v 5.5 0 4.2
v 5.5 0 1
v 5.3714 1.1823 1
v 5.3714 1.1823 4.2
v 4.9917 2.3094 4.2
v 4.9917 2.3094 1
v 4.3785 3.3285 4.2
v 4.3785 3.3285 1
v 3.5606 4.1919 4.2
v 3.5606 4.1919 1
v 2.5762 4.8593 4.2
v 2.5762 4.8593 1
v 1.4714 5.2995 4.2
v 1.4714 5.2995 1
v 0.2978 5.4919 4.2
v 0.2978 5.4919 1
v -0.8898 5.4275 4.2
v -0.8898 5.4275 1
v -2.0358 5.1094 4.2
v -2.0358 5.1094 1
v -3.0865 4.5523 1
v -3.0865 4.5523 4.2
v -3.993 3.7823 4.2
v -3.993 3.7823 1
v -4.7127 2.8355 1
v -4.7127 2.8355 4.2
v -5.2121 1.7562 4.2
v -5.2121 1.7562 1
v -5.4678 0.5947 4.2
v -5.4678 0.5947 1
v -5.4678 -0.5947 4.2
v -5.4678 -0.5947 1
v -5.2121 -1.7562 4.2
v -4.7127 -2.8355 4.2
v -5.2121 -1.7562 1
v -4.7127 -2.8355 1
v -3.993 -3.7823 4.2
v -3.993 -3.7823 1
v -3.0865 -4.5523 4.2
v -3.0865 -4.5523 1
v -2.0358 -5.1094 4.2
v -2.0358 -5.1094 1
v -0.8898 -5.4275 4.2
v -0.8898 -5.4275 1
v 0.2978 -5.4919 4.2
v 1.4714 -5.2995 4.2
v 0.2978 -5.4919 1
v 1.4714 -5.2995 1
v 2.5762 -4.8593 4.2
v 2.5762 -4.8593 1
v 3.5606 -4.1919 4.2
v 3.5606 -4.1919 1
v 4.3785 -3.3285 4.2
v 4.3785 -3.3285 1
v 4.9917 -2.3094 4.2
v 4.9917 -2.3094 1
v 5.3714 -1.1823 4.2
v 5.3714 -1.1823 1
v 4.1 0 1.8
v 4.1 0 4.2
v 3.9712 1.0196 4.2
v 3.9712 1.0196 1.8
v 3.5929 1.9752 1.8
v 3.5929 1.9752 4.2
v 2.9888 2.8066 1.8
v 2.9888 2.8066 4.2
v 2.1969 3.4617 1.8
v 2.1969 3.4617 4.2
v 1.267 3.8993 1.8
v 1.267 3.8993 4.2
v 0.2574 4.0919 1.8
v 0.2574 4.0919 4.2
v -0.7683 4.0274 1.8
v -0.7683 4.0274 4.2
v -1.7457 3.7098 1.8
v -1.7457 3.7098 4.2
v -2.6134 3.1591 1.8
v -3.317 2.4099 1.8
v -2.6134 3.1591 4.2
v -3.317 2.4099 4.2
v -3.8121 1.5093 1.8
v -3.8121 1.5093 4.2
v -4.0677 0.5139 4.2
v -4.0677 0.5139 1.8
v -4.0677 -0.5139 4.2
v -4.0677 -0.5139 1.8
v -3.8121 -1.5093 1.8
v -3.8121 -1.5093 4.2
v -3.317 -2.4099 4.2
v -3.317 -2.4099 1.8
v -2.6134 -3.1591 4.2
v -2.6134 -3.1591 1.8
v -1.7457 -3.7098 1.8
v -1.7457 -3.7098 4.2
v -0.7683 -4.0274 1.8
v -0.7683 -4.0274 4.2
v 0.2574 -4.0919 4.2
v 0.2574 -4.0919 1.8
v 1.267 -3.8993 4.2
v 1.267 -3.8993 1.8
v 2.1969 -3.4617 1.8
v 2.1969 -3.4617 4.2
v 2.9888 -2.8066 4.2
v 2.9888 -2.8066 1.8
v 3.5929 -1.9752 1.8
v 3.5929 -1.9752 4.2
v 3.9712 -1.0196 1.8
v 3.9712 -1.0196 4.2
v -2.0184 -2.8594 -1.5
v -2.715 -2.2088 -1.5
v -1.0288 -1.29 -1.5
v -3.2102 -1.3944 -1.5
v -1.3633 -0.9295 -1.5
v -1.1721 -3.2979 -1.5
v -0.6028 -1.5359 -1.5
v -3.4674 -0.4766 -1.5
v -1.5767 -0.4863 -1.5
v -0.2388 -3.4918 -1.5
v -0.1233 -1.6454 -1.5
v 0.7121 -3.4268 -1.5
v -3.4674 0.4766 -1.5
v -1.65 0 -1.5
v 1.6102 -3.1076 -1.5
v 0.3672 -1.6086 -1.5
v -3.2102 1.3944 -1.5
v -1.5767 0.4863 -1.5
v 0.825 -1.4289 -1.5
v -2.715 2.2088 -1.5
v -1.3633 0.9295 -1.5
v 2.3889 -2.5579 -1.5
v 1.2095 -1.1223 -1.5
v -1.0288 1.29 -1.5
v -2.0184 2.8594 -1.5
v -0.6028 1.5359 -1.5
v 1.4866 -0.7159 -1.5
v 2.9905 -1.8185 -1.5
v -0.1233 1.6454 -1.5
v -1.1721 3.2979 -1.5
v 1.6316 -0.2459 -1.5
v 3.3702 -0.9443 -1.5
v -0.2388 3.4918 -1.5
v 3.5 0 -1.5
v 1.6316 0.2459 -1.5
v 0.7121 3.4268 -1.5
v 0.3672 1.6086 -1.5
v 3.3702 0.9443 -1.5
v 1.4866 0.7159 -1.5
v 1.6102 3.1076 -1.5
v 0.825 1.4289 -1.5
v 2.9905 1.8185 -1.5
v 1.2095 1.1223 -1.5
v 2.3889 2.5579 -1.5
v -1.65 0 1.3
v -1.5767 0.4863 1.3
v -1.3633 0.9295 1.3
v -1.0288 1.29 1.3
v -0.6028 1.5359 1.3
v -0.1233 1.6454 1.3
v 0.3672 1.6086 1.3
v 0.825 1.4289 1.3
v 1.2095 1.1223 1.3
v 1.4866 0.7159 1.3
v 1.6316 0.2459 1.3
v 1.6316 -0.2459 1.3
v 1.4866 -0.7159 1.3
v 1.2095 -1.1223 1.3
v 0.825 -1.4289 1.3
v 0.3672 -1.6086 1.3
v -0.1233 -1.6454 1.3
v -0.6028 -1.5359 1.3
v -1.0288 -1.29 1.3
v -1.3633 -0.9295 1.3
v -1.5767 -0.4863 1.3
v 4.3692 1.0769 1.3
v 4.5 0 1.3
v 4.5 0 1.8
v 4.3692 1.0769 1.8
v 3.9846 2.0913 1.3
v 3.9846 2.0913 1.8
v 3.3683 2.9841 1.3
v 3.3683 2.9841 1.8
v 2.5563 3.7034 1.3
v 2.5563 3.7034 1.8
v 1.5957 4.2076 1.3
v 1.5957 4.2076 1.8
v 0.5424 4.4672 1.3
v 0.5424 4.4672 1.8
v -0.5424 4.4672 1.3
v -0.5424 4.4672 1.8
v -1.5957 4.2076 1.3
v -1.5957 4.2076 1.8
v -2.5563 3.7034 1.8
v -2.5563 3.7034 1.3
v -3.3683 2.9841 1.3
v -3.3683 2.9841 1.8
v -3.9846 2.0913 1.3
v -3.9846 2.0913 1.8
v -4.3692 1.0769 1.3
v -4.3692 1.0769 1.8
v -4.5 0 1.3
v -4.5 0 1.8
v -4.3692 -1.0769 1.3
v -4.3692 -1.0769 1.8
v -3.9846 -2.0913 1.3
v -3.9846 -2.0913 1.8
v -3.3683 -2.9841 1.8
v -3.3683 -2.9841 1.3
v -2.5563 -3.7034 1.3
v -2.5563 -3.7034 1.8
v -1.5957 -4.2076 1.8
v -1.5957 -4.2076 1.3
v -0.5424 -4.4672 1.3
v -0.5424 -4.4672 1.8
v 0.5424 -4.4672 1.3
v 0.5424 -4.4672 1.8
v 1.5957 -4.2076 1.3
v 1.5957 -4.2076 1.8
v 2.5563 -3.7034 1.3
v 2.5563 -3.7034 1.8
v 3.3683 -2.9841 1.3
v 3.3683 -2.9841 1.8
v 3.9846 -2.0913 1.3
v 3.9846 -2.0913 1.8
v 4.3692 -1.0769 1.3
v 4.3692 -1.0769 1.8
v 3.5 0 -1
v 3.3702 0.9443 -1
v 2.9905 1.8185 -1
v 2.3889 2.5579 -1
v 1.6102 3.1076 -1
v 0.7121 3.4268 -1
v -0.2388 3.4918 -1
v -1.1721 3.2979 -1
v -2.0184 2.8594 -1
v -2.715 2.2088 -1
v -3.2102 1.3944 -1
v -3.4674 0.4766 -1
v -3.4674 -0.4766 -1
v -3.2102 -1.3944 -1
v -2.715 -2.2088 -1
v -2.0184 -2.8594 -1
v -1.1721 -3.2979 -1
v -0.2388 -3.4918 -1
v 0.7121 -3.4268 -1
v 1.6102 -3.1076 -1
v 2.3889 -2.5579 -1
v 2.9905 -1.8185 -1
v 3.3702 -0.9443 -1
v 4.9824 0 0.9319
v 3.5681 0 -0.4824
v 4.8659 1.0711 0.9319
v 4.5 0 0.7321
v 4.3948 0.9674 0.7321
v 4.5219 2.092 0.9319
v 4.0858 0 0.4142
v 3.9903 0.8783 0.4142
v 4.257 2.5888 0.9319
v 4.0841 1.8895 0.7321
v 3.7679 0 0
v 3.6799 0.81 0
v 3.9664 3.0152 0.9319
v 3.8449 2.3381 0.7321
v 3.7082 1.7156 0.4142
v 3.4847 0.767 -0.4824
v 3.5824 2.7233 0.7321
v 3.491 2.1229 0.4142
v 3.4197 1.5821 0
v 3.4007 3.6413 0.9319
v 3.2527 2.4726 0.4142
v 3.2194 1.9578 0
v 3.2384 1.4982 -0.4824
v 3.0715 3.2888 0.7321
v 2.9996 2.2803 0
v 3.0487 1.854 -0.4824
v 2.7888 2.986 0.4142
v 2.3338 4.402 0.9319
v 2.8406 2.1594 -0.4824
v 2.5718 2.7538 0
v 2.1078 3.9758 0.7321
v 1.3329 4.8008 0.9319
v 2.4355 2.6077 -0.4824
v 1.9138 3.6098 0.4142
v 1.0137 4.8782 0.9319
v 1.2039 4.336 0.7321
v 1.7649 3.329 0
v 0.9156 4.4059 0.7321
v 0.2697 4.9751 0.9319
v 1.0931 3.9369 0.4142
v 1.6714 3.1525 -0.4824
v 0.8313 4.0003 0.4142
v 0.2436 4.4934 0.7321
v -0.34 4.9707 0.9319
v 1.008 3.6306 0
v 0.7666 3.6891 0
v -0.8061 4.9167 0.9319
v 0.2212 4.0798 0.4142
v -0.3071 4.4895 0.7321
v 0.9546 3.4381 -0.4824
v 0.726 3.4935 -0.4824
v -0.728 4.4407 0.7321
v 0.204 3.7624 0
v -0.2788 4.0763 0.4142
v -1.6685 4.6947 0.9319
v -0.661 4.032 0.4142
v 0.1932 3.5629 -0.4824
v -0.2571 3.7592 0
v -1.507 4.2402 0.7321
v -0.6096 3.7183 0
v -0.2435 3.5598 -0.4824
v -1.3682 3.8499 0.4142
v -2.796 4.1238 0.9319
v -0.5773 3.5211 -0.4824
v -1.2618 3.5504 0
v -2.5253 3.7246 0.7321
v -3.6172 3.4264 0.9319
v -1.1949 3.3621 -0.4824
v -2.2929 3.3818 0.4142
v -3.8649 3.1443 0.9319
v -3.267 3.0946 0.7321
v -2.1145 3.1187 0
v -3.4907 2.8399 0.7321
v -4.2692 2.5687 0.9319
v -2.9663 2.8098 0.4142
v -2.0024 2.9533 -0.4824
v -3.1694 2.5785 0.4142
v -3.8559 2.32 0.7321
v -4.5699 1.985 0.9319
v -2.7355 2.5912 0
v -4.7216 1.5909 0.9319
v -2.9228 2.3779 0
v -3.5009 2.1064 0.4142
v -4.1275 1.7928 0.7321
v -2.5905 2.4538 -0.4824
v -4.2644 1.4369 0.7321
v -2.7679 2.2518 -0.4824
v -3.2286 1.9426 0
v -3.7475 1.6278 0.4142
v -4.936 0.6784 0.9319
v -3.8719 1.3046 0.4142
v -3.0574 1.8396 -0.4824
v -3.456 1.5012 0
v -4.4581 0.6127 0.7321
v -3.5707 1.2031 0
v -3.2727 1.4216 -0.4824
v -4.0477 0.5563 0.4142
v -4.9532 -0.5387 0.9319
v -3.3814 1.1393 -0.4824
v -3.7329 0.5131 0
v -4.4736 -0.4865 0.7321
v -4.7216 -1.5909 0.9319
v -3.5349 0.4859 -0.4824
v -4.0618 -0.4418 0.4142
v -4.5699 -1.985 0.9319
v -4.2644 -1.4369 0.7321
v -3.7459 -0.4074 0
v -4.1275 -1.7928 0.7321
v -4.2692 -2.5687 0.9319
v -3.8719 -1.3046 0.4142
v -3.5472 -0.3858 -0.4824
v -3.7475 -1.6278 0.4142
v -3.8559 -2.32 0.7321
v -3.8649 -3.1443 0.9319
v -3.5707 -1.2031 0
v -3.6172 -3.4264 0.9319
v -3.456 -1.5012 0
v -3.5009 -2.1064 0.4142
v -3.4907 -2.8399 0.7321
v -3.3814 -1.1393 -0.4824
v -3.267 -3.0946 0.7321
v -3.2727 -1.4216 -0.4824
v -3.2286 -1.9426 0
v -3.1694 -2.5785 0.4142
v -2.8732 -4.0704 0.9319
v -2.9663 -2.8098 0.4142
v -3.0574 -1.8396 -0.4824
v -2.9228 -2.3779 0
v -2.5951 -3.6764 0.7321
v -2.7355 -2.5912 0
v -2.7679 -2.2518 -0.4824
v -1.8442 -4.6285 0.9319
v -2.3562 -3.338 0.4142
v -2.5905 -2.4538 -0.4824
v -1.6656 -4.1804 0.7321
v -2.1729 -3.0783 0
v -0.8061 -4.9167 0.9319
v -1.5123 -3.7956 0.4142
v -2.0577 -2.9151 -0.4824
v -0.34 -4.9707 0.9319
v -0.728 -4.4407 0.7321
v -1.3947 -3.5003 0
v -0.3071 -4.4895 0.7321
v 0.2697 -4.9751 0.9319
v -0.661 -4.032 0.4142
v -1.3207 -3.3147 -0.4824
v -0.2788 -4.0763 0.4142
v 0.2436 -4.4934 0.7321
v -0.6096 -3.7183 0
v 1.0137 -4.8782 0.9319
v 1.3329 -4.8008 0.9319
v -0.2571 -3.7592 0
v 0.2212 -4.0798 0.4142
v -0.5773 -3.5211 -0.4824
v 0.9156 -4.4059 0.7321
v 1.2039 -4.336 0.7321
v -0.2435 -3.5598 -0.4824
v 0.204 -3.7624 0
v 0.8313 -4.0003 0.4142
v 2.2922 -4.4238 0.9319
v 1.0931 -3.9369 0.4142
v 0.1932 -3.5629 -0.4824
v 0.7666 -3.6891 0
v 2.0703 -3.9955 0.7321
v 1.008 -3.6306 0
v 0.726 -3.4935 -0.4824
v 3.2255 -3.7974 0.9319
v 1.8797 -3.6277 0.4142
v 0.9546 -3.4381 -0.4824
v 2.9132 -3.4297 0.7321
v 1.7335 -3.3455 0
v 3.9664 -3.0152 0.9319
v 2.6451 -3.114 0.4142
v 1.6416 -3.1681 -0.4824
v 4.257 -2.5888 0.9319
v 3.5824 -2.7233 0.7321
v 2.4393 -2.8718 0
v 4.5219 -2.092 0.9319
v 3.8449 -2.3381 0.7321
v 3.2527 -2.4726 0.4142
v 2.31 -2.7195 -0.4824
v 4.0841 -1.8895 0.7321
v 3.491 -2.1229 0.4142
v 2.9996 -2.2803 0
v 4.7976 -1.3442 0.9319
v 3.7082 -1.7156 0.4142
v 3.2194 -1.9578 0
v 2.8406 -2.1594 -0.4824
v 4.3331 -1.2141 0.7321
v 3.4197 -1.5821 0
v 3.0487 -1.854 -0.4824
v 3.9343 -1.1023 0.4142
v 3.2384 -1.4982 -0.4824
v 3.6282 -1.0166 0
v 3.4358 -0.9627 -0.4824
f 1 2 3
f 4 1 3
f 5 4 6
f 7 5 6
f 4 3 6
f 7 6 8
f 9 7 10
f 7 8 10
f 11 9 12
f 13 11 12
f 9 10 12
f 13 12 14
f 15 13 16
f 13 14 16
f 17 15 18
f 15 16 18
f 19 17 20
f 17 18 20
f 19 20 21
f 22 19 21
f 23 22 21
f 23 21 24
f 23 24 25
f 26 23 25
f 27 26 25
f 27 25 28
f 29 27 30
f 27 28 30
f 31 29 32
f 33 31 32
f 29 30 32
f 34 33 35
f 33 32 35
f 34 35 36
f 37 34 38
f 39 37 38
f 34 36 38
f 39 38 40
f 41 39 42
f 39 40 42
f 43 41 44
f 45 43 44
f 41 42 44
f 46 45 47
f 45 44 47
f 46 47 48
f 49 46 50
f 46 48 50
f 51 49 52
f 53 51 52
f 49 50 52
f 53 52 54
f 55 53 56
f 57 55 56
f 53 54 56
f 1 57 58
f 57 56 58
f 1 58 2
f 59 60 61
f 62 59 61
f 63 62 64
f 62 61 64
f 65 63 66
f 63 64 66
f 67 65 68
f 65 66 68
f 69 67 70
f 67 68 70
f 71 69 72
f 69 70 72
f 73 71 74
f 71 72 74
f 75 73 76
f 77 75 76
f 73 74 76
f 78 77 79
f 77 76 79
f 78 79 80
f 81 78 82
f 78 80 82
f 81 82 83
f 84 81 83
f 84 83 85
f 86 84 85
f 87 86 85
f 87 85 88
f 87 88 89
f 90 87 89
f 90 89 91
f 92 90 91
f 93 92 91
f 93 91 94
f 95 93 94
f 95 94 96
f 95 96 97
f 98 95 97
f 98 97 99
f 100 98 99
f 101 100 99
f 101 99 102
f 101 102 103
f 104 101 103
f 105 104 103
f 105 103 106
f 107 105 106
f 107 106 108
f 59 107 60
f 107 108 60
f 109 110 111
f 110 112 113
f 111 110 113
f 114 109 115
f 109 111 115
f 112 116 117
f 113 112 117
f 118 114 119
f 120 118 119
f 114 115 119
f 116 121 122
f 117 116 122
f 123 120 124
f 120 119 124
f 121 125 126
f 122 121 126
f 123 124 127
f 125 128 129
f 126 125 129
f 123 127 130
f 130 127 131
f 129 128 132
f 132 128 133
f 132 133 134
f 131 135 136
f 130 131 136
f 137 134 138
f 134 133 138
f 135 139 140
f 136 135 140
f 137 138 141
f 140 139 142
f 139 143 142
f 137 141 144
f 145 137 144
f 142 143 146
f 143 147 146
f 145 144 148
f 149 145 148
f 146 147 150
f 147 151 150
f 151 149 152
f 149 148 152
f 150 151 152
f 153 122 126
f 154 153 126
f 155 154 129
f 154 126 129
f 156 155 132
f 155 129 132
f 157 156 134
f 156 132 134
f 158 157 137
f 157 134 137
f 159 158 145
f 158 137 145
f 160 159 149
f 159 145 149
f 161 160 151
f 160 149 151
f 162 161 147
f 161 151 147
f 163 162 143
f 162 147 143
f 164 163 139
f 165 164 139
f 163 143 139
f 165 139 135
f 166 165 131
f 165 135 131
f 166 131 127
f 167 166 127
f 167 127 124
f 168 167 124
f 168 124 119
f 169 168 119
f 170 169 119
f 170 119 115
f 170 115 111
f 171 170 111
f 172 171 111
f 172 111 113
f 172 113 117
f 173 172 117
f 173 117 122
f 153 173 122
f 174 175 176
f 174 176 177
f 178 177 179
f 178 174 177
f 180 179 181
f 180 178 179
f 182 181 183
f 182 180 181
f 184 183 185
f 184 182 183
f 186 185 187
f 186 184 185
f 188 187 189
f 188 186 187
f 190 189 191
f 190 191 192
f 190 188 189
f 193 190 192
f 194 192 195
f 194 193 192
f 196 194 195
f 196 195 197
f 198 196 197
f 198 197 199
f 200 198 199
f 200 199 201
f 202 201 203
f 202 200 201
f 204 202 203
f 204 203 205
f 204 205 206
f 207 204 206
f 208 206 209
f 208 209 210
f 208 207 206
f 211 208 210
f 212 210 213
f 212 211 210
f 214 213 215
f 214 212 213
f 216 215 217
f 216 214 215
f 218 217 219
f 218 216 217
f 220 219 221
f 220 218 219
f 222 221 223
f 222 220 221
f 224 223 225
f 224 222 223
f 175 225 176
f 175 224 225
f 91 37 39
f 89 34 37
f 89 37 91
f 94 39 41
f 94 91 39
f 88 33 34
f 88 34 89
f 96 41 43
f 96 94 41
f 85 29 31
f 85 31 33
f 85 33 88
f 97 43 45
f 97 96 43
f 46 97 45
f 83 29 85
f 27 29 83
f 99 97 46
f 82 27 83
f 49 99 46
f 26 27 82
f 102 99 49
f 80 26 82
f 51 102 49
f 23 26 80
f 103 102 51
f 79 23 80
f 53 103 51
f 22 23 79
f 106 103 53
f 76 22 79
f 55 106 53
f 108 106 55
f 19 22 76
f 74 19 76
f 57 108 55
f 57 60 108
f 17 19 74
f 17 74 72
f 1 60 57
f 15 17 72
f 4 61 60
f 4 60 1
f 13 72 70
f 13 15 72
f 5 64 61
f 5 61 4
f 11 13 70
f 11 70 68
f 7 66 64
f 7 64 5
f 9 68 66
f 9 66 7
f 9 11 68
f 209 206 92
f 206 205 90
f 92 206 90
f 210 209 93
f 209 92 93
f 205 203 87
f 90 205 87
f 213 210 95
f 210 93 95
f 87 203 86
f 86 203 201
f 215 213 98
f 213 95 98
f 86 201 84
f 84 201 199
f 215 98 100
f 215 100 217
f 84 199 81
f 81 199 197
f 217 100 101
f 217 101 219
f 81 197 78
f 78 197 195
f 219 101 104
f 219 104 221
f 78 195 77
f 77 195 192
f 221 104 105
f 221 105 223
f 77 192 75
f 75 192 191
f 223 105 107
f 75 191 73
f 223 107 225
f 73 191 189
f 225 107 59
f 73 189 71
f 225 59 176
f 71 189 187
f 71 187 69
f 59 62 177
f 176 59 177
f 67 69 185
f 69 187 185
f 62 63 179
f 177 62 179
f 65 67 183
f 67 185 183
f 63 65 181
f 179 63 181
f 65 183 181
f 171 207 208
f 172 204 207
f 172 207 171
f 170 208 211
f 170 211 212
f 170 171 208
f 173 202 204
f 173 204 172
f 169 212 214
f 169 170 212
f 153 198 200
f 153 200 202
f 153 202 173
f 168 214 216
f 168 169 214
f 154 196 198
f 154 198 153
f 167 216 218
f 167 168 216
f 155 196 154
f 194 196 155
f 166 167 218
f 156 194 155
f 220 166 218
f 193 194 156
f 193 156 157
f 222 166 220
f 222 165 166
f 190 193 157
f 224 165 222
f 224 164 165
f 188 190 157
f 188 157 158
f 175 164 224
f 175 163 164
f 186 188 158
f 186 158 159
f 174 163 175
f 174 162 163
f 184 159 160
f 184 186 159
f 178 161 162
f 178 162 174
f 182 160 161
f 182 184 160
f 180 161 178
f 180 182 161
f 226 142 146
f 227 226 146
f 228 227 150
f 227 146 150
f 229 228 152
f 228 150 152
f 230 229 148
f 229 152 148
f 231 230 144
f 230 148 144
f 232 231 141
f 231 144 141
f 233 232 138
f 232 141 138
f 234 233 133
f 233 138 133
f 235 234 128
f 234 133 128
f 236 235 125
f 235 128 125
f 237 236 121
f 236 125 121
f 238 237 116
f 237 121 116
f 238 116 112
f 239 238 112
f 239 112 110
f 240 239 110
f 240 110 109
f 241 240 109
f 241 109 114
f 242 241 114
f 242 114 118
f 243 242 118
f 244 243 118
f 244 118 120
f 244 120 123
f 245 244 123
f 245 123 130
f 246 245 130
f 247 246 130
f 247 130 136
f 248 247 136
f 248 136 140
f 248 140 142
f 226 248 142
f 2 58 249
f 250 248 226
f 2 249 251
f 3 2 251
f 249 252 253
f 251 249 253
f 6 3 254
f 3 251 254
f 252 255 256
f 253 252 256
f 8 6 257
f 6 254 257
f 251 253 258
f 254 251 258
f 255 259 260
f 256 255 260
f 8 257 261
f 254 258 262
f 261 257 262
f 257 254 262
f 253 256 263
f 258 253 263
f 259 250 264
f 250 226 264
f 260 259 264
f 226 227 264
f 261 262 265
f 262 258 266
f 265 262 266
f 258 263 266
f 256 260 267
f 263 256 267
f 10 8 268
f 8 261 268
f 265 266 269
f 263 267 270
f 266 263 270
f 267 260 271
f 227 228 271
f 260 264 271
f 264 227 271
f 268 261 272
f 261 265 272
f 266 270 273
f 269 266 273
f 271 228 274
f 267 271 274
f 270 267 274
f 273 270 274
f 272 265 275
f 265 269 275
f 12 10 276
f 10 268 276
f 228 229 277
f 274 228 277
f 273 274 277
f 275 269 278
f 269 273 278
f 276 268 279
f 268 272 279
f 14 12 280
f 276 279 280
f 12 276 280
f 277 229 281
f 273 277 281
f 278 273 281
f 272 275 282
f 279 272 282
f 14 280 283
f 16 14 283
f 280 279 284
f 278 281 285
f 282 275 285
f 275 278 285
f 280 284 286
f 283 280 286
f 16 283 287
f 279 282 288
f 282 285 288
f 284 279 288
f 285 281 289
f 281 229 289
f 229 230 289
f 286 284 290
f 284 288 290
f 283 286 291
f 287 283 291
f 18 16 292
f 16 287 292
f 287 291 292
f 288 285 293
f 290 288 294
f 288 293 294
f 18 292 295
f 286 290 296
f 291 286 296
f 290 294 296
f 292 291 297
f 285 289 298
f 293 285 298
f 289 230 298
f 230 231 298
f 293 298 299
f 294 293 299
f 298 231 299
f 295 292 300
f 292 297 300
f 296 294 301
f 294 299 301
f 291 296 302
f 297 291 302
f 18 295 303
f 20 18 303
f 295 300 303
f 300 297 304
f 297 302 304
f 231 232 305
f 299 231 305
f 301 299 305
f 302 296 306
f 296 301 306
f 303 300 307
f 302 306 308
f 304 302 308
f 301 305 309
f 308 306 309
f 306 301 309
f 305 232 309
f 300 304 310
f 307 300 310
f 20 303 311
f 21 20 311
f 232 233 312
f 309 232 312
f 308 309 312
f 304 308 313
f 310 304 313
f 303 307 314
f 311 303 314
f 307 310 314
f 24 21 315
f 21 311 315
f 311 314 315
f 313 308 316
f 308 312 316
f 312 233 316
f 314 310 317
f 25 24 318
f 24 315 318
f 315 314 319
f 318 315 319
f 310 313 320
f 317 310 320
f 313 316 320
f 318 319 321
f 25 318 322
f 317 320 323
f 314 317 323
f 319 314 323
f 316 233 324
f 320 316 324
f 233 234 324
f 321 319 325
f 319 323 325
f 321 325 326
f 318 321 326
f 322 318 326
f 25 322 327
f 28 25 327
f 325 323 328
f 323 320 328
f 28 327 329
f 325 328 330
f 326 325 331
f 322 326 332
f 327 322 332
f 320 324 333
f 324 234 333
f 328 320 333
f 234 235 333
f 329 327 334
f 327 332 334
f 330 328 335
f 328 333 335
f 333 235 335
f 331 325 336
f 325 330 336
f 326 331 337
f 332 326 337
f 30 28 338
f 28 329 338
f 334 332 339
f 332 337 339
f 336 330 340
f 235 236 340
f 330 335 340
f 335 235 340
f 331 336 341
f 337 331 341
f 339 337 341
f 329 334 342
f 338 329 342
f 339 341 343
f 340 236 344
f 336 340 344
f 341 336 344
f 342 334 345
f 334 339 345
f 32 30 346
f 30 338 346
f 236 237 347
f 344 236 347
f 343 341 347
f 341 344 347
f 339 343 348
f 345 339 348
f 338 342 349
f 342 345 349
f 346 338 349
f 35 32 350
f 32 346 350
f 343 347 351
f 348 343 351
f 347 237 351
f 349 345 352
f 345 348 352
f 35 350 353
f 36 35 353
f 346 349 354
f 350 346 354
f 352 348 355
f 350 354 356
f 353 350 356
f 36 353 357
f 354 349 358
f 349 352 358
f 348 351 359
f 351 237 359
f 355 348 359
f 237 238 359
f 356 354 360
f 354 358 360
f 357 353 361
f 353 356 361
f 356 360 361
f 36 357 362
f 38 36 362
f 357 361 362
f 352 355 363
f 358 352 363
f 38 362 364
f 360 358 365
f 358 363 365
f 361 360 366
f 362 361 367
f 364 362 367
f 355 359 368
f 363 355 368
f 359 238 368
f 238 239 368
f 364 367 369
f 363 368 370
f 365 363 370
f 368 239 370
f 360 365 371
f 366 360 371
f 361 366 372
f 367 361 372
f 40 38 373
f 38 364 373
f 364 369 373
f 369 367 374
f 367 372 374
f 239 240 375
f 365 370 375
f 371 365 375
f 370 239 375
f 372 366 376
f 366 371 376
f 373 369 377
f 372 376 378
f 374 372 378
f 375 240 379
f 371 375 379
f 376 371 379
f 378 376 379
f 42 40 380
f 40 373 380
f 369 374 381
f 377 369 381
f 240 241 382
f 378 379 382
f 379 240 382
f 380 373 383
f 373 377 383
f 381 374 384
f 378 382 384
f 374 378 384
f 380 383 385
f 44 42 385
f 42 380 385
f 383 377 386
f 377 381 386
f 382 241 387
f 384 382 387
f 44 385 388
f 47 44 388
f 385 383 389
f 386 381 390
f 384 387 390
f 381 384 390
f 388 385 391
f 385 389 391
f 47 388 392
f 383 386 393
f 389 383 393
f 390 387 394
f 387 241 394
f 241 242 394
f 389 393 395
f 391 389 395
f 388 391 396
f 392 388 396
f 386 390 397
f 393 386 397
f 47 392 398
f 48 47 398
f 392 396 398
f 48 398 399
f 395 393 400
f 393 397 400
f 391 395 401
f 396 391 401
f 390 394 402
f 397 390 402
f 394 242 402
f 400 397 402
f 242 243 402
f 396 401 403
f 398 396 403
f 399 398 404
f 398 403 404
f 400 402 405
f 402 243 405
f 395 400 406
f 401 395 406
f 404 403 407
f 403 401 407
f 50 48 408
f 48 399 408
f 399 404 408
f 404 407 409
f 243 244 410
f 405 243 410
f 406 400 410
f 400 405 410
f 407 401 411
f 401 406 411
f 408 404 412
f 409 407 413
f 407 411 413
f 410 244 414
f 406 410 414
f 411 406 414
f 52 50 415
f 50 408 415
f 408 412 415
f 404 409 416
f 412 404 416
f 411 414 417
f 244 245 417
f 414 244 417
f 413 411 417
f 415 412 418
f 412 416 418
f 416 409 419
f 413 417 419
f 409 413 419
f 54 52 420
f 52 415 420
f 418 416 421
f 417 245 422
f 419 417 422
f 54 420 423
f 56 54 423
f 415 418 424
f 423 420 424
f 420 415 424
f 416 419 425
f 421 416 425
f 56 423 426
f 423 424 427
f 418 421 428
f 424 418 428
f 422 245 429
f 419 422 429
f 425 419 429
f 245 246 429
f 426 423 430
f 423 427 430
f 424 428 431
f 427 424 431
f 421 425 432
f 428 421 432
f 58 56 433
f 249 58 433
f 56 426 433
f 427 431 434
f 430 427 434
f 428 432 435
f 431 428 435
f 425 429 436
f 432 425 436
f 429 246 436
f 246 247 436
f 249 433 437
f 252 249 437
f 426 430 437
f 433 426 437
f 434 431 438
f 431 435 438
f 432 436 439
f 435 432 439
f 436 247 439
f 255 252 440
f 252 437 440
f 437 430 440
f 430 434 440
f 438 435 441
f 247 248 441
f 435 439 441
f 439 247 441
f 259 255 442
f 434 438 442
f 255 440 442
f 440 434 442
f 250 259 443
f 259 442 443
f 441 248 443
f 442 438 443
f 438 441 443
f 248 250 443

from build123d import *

# Parameters (mm, degrees)
BOSS_EXTRUDE1_DEPTH      = 1
BOSS_EXTRUDE1_DEPTH_BACK = 1.5
SKETCH1_R                = 3.5
SKETCH1_R_2              = 1.625
SKETCH2_R                = 5.5
BOSS_EXTRUDE2_DEPTH      = 3.2
SKETCH3_R                = 4.1
CUT_EXTRUDE1_DEPTH       = 2.9
SKETCH4_R                = 1.65
CUT_EXTRUDE2_DEPTH       = 10
FILLET2_R                = 2
SKETCH5_R                = 4.5
CUT_EXTRUDE3_DEPTH       = 0.5


with BuildPart() as part:
    # Sketch1 → Boss-Extrude1 (new, two sides: drawn at the far end of the back side and taken through both)
    with BuildSketch(Plane.XY.offset(-BOSS_EXTRUDE1_DEPTH_BACK)):
        Circle(SKETCH1_R)
        Circle(SKETCH1_R_2, mode=Mode.SUBTRACT)
    extrude(amount=BOSS_EXTRUDE1_DEPTH + BOSS_EXTRUDE1_DEPTH_BACK)

    # Sketch2 → Boss-Extrude2 (add)
    with BuildSketch(Plane.XY.offset(1)):
        Circle(SKETCH2_R)
    extrude(amount=BOSS_EXTRUDE2_DEPTH)

    # Sketch3 → Cut-Extrude1 (cut)
    with BuildSketch(Plane.XY.offset(4.2)):
        Circle(SKETCH3_R)
    extrude(amount=-CUT_EXTRUDE1_DEPTH, mode=Mode.SUBTRACT)

    # Sketch4 → Cut-Extrude2 (cut)
    with BuildSketch(Plane(origin=(0, 0, -1.5), x_dir=(-1, 0, 0), z_dir=(0, 0, -1))):
        Circle(SKETCH4_R)
    extrude(amount=-CUT_EXTRUDE2_DEPTH, mode=Mode.SUBTRACT)

    # Fillet2
    # the kernel refuses this fillet: 2 mm, written as the material it adds along each edge
    with BuildSketch(Plane(origin=(0, 0, 1), x_dir=(1, 0, 0), z_dir=(0, -1, 0))) as fillet2_piece_1:
        with BuildLine():
            CenterArc((3.5 + FILLET2_R, -FILLET2_R), FILLET2_R, 90, 90)
            Line((3.5, -FILLET2_R), (3.5, 0))
            Line((3.5, 0), (3.5 + FILLET2_R, 0))
        make_face()
    revolve(axis=Axis((0, 0, 1), (0, 0, 1)))

    # Sketch5 → Cut-Extrude3 (cut)
    with BuildSketch(Plane.XY.offset(1.3)):
        Circle(SKETCH5_R)
    extrude(amount=CUT_EXTRUDE3_DEPTH, mode=Mode.SUBTRACT)


solid = part.part
